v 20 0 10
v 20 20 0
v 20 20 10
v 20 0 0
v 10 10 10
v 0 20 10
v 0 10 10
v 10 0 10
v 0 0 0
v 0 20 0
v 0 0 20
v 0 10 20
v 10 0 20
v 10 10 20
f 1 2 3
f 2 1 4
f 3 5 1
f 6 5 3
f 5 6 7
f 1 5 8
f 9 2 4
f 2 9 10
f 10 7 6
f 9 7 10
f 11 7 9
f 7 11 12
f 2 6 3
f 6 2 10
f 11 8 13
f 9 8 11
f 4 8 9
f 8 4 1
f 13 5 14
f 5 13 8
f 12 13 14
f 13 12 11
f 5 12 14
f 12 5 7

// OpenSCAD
//Exempl0 2 - uso da operação union()

union(){
    cube([20,20,10]);
    cube([10,10,20]);
}
